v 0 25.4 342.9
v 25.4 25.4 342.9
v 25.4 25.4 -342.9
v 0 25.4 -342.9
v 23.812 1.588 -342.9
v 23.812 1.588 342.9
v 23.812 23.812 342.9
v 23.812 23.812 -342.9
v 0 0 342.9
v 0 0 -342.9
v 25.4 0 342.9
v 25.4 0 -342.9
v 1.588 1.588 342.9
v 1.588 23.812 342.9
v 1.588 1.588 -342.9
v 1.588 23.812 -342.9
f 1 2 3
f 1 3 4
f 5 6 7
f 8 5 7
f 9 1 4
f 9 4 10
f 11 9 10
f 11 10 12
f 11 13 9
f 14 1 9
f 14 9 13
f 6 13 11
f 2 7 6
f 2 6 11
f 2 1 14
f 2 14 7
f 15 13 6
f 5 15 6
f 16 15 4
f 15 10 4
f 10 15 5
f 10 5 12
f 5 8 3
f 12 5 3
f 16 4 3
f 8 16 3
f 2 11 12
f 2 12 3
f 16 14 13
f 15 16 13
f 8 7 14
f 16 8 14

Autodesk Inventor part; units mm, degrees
ref_plane "YZ Plane" through (0, 0, 0) normal (1, 0, 0) x (0, 1, 0)
ref_plane "XZ Plane" through (0, 0, 0) normal (0, 1, 0) x (-1, 0, 0)
ref_plane "XY Plane" through (0, 0, 0) normal (0, 0, 1) x (1, 0, 0)
sketch "Sketch1" plane through (0, 0, 0) normal (0, 0, 1) x (1, 0, 0)
  line L0 (0, 0) -> (25.4, 0)
  line L1 (25.4, 0) -> (25.4, 25.4)
  line L2 (25.4, 25.4) -> (0, 25.4)
  line L3 (0, 25.4) -> (0, 0)
  line L4 (1.5875, 1.5875) -> (23.8125, 1.5875)
  line L5 (23.8125, 1.5875) -> (23.8125, 23.8125)
  line L6 (23.8125, 23.8125) -> (1.5875, 23.8125)
  line L7 (1.5875, 23.8125) -> (1.5875, 1.5875)
  dimension "d0" = 25.4
  dimension "d1" = 25.4
  dimension "d2" = 1.5875
extrude "Extrusion1" add sketch "Sketch1" along normal mid plane 685.8
properties part number "SUP_005_Middle ConnectorBar" material "Aluminum 6061"
